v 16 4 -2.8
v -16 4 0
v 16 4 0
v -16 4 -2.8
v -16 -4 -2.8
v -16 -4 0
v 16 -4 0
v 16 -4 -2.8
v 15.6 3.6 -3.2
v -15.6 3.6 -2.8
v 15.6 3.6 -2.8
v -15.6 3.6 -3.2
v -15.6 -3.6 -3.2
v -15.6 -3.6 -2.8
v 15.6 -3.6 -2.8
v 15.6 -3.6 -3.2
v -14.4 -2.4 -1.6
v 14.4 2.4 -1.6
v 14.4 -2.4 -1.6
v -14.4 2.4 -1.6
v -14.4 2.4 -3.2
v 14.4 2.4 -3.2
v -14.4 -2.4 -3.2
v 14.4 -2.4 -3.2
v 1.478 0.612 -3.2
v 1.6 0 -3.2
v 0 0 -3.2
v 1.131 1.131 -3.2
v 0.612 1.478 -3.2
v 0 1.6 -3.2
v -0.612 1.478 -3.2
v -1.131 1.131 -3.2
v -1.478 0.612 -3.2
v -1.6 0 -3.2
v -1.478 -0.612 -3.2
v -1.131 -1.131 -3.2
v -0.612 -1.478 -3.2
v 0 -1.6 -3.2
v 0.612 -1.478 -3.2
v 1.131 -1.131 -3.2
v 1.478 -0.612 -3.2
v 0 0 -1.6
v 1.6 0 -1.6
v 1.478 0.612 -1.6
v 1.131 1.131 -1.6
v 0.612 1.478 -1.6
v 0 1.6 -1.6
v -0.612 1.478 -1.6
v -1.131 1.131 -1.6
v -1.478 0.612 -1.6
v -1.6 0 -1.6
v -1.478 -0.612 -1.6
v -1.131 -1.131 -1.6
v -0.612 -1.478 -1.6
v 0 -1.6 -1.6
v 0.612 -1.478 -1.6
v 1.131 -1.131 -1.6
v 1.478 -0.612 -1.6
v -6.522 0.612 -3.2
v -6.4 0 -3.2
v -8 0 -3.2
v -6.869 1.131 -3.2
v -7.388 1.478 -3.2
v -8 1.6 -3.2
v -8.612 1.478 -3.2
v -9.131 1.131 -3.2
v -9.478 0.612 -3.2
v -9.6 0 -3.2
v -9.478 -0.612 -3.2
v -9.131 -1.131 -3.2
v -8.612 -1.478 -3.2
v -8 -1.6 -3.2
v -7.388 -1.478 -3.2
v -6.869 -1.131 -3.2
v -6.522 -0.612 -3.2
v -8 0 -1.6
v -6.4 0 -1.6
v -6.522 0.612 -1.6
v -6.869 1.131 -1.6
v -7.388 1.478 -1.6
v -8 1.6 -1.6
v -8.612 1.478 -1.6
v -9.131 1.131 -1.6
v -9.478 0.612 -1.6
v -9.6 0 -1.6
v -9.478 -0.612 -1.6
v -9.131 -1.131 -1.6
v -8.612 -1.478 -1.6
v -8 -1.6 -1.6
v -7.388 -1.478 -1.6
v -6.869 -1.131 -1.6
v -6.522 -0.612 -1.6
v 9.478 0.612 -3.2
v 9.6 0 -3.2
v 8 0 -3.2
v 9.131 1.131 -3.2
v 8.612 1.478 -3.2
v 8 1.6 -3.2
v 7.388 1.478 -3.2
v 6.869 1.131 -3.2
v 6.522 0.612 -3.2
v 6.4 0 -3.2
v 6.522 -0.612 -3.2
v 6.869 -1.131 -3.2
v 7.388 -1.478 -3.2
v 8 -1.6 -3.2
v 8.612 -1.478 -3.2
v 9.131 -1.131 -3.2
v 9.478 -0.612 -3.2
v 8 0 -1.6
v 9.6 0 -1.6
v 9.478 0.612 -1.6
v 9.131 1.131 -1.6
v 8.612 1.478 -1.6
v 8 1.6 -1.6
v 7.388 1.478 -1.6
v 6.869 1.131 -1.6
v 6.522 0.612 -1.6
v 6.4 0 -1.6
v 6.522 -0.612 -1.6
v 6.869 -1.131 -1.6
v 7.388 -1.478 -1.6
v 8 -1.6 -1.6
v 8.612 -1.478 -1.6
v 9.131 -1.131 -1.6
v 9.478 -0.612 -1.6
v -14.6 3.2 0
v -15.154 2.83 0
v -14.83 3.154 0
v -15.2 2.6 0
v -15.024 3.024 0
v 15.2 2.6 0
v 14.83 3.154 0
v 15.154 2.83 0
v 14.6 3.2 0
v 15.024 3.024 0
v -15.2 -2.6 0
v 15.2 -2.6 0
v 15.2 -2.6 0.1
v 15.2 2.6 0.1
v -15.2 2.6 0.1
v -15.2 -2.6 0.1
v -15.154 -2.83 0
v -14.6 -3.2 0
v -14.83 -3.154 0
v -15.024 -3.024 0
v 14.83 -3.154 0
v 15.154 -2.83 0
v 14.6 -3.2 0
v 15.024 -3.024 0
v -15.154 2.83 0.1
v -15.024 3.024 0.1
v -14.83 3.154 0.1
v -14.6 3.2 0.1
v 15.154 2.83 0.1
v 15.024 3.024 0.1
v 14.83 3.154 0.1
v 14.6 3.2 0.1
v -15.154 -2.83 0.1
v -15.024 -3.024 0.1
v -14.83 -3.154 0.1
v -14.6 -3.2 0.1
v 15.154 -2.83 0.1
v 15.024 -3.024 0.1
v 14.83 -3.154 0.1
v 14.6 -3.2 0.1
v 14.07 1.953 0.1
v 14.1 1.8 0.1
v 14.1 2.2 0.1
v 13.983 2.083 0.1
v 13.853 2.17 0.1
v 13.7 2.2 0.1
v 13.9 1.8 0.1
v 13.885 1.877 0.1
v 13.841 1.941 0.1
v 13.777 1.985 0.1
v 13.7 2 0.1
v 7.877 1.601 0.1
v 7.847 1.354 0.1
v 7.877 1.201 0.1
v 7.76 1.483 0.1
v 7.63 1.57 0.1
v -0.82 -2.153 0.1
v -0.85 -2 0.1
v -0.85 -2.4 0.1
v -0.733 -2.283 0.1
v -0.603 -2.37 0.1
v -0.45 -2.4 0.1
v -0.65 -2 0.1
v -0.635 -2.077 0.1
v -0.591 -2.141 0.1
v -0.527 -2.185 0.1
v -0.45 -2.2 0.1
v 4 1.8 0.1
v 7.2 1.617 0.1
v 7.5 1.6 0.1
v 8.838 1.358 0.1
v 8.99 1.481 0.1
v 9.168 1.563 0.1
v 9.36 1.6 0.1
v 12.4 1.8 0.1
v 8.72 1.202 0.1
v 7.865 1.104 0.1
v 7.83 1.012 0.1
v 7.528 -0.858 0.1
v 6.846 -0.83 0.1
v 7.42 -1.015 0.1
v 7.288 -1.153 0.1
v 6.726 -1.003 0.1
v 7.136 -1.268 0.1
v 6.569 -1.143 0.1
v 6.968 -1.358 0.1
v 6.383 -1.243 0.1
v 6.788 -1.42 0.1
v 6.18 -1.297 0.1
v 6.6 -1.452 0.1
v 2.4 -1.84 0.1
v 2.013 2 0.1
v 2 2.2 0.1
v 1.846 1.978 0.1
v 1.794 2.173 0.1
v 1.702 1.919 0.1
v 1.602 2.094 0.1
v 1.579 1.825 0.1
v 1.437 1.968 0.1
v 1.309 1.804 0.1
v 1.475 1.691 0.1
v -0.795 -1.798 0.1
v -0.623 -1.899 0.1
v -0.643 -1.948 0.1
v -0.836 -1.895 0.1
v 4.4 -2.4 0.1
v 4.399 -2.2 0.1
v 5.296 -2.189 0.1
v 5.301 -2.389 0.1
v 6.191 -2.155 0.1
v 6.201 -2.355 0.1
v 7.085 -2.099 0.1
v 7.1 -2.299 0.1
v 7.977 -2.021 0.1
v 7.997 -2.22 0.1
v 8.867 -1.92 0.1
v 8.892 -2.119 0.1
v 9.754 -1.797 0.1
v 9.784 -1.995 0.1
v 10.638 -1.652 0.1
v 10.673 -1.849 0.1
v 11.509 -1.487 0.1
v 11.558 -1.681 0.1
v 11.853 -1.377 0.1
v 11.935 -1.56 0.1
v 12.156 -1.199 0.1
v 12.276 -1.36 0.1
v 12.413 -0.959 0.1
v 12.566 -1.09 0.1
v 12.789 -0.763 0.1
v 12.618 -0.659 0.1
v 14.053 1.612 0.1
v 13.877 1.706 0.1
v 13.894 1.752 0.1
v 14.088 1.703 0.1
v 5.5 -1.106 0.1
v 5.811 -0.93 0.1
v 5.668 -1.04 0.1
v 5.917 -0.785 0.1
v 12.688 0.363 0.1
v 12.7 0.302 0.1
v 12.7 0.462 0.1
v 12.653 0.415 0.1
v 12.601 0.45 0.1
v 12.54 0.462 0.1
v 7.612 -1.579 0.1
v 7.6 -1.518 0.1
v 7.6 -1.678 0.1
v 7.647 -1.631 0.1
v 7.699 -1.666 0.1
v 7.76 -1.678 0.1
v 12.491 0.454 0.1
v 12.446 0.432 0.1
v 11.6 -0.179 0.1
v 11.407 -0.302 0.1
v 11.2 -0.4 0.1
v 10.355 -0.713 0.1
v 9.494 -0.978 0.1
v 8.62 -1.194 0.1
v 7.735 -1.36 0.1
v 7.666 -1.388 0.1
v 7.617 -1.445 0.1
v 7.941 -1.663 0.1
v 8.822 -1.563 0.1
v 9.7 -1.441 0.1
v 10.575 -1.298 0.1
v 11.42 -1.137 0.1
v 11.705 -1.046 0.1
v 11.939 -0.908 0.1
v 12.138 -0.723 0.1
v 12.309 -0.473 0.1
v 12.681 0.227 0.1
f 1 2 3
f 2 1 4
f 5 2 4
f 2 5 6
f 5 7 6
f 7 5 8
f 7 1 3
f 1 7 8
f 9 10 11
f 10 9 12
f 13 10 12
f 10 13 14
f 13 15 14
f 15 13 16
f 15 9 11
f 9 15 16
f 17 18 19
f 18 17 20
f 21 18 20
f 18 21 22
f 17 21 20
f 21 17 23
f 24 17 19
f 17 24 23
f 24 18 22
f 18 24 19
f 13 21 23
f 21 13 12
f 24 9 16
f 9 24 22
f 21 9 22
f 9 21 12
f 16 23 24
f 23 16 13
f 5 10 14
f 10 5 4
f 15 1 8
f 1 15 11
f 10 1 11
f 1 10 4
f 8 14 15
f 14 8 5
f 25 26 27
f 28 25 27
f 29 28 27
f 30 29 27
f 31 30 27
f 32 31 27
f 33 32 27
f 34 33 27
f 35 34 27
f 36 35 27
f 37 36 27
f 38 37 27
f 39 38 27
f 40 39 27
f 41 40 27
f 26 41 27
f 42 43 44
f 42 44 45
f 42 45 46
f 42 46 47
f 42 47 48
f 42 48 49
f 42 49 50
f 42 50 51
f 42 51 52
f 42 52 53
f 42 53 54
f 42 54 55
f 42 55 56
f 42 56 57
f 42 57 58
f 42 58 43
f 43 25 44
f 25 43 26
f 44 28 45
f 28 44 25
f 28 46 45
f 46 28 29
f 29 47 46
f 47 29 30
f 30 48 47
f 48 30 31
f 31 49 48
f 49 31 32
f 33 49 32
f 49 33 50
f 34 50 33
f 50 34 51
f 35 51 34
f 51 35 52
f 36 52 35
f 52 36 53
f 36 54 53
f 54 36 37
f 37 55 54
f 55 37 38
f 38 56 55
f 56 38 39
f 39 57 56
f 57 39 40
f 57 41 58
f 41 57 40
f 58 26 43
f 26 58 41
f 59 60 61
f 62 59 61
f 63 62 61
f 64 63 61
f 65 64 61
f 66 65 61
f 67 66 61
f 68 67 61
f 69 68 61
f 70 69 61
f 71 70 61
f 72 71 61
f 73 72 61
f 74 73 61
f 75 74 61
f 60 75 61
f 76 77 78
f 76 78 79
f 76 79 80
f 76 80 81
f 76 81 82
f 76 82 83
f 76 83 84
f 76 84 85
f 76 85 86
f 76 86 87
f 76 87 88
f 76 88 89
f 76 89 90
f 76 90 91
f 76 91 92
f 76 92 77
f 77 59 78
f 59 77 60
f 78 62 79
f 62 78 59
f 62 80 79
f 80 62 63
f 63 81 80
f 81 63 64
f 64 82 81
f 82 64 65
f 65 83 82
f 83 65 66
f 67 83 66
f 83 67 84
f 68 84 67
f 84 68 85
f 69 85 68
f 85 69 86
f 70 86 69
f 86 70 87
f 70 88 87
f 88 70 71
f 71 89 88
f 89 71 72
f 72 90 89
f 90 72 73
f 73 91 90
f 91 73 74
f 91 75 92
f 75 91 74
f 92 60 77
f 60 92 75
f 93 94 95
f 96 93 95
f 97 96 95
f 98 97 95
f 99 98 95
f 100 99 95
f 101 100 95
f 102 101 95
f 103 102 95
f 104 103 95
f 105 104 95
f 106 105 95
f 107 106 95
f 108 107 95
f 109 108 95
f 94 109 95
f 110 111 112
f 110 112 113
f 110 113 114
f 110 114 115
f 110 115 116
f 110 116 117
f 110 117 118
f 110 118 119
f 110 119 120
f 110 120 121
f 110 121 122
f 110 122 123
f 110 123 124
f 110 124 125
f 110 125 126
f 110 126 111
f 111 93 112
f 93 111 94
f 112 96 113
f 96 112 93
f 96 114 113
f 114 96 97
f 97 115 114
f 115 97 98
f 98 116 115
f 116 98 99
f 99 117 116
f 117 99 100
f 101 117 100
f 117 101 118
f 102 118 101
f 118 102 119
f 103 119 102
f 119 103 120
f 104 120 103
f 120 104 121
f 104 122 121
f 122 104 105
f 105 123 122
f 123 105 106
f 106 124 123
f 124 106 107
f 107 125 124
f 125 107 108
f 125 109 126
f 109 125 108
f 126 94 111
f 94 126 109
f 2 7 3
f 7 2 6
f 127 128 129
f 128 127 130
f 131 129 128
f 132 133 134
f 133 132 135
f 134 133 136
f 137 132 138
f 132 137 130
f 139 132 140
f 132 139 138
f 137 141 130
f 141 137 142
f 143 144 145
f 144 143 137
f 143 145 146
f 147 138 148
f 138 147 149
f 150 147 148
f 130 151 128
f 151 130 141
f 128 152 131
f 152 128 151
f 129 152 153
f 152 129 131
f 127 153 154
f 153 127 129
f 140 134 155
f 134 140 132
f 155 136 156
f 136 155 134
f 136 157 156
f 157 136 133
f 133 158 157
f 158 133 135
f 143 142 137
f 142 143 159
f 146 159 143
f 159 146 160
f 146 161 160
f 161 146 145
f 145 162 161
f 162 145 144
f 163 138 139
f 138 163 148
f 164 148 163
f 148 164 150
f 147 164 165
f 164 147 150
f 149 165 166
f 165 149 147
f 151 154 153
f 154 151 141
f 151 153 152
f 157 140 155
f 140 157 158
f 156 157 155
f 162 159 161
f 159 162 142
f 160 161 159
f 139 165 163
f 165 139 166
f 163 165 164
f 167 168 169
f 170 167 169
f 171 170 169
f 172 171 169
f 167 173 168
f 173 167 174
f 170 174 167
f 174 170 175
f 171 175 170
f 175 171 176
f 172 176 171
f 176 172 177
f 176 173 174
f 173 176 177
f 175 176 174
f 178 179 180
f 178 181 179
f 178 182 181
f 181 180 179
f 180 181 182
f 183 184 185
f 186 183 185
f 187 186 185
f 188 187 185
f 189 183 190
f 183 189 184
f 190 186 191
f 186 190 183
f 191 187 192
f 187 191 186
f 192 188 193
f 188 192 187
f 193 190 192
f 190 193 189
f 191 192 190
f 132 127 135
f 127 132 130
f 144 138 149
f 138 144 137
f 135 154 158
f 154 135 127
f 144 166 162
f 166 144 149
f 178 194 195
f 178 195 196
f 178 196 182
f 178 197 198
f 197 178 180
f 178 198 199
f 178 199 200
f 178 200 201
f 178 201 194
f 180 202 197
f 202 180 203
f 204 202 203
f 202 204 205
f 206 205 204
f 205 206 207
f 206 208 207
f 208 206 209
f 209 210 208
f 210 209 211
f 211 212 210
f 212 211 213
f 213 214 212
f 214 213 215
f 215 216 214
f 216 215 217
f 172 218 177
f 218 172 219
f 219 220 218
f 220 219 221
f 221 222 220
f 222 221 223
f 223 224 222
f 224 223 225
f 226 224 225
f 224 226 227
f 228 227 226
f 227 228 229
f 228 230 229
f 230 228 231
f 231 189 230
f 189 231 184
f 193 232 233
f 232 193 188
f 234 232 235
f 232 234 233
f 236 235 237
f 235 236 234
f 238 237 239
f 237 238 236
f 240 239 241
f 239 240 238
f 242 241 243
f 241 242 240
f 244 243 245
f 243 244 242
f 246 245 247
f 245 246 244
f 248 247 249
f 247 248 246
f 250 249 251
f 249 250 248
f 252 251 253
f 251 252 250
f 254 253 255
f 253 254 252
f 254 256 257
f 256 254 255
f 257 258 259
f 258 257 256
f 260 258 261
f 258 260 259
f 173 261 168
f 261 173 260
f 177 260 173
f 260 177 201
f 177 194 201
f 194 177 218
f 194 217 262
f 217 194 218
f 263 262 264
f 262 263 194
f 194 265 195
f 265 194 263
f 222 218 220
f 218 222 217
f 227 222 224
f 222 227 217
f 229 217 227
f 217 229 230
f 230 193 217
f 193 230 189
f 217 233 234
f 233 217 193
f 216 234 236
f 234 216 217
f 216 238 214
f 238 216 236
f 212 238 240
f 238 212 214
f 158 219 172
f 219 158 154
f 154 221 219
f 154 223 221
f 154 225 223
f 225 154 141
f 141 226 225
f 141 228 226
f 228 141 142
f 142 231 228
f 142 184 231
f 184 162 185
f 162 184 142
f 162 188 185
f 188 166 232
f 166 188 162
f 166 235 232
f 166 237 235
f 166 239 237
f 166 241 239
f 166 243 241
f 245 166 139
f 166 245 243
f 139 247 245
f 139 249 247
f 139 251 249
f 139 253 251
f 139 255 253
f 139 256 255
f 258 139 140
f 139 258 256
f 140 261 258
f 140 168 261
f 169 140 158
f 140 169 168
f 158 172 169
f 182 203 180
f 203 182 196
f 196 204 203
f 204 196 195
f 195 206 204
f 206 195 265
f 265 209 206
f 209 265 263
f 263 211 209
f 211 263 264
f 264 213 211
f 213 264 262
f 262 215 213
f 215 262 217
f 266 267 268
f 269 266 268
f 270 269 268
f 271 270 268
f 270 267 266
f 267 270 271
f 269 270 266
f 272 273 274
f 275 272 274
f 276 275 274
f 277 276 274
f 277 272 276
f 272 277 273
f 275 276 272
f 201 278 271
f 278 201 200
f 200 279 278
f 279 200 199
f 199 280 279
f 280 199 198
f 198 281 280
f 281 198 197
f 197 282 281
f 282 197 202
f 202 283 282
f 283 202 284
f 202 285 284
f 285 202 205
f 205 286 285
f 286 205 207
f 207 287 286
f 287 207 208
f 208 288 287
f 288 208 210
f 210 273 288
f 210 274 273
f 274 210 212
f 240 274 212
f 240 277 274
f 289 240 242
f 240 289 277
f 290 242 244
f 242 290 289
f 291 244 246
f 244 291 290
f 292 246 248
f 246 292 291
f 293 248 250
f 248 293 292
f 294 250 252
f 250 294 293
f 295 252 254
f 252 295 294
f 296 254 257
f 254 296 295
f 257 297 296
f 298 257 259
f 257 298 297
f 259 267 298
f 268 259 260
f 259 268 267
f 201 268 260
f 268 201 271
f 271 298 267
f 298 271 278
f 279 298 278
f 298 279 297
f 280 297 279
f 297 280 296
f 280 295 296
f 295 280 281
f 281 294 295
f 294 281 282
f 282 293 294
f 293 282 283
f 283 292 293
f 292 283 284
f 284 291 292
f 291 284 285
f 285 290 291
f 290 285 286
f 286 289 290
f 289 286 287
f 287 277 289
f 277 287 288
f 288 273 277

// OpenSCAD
use <../lib.scad>
use <2431.scad>
use <6141955d.scad>
function ldraw_lib__2431d1a() = [
// 0 Tile  1 x  4 with Black Air Vents and White Reflex on Blue Background Left Sticker
// 0 Name: 2431d1a.dat
// 0 Author: Alfred Schmitz [AlfredS]
// 0 !LDRAW_ORG Shortcut UPDATE 2026-09
// 0 !LICENSE Licensed under CC BY 4.0 : see CAreadme.txt
// 
// 0 BFC CERTIFY CCW
  [0,"BFC","CERTIFY"],
  [0,"BFC","CCW"],
// 
// 0 !CATEGORY Sticker Shortcut
// 0 !KEYWORDS Ford, GT, Mustang, Set 75871, Speed Champions
// 
// 0 !HISTORY 2026-09-30 [OrionP] Official Update 2026-09
// 
// 1 16 0 0 0 1 0 0 0 1 0 0 0 1 2431.dat
  [1,16,0,0,0,1,0,0,0,1,0,0,0,1, ldraw_lib__2431()],
// 1 16 0 0 0 1 0 0 0 1 0 0 0 1 6141955d.dat
  [1,16,0,0,0,1,0,0,0,1,0,0,0,1, ldraw_lib__6141955d()],
];
module ldraw_lib__2431d1a(step=0, col=false, unit=2/5, alt=false, line=0.2, solid=!$preview)
    makepoly(ldraw_lib__2431d1a(), step=step, col=col, unit=unit, alt=alt, line=line, solid=solid);
ldraw_lib__2431d1a(line=0.2);
